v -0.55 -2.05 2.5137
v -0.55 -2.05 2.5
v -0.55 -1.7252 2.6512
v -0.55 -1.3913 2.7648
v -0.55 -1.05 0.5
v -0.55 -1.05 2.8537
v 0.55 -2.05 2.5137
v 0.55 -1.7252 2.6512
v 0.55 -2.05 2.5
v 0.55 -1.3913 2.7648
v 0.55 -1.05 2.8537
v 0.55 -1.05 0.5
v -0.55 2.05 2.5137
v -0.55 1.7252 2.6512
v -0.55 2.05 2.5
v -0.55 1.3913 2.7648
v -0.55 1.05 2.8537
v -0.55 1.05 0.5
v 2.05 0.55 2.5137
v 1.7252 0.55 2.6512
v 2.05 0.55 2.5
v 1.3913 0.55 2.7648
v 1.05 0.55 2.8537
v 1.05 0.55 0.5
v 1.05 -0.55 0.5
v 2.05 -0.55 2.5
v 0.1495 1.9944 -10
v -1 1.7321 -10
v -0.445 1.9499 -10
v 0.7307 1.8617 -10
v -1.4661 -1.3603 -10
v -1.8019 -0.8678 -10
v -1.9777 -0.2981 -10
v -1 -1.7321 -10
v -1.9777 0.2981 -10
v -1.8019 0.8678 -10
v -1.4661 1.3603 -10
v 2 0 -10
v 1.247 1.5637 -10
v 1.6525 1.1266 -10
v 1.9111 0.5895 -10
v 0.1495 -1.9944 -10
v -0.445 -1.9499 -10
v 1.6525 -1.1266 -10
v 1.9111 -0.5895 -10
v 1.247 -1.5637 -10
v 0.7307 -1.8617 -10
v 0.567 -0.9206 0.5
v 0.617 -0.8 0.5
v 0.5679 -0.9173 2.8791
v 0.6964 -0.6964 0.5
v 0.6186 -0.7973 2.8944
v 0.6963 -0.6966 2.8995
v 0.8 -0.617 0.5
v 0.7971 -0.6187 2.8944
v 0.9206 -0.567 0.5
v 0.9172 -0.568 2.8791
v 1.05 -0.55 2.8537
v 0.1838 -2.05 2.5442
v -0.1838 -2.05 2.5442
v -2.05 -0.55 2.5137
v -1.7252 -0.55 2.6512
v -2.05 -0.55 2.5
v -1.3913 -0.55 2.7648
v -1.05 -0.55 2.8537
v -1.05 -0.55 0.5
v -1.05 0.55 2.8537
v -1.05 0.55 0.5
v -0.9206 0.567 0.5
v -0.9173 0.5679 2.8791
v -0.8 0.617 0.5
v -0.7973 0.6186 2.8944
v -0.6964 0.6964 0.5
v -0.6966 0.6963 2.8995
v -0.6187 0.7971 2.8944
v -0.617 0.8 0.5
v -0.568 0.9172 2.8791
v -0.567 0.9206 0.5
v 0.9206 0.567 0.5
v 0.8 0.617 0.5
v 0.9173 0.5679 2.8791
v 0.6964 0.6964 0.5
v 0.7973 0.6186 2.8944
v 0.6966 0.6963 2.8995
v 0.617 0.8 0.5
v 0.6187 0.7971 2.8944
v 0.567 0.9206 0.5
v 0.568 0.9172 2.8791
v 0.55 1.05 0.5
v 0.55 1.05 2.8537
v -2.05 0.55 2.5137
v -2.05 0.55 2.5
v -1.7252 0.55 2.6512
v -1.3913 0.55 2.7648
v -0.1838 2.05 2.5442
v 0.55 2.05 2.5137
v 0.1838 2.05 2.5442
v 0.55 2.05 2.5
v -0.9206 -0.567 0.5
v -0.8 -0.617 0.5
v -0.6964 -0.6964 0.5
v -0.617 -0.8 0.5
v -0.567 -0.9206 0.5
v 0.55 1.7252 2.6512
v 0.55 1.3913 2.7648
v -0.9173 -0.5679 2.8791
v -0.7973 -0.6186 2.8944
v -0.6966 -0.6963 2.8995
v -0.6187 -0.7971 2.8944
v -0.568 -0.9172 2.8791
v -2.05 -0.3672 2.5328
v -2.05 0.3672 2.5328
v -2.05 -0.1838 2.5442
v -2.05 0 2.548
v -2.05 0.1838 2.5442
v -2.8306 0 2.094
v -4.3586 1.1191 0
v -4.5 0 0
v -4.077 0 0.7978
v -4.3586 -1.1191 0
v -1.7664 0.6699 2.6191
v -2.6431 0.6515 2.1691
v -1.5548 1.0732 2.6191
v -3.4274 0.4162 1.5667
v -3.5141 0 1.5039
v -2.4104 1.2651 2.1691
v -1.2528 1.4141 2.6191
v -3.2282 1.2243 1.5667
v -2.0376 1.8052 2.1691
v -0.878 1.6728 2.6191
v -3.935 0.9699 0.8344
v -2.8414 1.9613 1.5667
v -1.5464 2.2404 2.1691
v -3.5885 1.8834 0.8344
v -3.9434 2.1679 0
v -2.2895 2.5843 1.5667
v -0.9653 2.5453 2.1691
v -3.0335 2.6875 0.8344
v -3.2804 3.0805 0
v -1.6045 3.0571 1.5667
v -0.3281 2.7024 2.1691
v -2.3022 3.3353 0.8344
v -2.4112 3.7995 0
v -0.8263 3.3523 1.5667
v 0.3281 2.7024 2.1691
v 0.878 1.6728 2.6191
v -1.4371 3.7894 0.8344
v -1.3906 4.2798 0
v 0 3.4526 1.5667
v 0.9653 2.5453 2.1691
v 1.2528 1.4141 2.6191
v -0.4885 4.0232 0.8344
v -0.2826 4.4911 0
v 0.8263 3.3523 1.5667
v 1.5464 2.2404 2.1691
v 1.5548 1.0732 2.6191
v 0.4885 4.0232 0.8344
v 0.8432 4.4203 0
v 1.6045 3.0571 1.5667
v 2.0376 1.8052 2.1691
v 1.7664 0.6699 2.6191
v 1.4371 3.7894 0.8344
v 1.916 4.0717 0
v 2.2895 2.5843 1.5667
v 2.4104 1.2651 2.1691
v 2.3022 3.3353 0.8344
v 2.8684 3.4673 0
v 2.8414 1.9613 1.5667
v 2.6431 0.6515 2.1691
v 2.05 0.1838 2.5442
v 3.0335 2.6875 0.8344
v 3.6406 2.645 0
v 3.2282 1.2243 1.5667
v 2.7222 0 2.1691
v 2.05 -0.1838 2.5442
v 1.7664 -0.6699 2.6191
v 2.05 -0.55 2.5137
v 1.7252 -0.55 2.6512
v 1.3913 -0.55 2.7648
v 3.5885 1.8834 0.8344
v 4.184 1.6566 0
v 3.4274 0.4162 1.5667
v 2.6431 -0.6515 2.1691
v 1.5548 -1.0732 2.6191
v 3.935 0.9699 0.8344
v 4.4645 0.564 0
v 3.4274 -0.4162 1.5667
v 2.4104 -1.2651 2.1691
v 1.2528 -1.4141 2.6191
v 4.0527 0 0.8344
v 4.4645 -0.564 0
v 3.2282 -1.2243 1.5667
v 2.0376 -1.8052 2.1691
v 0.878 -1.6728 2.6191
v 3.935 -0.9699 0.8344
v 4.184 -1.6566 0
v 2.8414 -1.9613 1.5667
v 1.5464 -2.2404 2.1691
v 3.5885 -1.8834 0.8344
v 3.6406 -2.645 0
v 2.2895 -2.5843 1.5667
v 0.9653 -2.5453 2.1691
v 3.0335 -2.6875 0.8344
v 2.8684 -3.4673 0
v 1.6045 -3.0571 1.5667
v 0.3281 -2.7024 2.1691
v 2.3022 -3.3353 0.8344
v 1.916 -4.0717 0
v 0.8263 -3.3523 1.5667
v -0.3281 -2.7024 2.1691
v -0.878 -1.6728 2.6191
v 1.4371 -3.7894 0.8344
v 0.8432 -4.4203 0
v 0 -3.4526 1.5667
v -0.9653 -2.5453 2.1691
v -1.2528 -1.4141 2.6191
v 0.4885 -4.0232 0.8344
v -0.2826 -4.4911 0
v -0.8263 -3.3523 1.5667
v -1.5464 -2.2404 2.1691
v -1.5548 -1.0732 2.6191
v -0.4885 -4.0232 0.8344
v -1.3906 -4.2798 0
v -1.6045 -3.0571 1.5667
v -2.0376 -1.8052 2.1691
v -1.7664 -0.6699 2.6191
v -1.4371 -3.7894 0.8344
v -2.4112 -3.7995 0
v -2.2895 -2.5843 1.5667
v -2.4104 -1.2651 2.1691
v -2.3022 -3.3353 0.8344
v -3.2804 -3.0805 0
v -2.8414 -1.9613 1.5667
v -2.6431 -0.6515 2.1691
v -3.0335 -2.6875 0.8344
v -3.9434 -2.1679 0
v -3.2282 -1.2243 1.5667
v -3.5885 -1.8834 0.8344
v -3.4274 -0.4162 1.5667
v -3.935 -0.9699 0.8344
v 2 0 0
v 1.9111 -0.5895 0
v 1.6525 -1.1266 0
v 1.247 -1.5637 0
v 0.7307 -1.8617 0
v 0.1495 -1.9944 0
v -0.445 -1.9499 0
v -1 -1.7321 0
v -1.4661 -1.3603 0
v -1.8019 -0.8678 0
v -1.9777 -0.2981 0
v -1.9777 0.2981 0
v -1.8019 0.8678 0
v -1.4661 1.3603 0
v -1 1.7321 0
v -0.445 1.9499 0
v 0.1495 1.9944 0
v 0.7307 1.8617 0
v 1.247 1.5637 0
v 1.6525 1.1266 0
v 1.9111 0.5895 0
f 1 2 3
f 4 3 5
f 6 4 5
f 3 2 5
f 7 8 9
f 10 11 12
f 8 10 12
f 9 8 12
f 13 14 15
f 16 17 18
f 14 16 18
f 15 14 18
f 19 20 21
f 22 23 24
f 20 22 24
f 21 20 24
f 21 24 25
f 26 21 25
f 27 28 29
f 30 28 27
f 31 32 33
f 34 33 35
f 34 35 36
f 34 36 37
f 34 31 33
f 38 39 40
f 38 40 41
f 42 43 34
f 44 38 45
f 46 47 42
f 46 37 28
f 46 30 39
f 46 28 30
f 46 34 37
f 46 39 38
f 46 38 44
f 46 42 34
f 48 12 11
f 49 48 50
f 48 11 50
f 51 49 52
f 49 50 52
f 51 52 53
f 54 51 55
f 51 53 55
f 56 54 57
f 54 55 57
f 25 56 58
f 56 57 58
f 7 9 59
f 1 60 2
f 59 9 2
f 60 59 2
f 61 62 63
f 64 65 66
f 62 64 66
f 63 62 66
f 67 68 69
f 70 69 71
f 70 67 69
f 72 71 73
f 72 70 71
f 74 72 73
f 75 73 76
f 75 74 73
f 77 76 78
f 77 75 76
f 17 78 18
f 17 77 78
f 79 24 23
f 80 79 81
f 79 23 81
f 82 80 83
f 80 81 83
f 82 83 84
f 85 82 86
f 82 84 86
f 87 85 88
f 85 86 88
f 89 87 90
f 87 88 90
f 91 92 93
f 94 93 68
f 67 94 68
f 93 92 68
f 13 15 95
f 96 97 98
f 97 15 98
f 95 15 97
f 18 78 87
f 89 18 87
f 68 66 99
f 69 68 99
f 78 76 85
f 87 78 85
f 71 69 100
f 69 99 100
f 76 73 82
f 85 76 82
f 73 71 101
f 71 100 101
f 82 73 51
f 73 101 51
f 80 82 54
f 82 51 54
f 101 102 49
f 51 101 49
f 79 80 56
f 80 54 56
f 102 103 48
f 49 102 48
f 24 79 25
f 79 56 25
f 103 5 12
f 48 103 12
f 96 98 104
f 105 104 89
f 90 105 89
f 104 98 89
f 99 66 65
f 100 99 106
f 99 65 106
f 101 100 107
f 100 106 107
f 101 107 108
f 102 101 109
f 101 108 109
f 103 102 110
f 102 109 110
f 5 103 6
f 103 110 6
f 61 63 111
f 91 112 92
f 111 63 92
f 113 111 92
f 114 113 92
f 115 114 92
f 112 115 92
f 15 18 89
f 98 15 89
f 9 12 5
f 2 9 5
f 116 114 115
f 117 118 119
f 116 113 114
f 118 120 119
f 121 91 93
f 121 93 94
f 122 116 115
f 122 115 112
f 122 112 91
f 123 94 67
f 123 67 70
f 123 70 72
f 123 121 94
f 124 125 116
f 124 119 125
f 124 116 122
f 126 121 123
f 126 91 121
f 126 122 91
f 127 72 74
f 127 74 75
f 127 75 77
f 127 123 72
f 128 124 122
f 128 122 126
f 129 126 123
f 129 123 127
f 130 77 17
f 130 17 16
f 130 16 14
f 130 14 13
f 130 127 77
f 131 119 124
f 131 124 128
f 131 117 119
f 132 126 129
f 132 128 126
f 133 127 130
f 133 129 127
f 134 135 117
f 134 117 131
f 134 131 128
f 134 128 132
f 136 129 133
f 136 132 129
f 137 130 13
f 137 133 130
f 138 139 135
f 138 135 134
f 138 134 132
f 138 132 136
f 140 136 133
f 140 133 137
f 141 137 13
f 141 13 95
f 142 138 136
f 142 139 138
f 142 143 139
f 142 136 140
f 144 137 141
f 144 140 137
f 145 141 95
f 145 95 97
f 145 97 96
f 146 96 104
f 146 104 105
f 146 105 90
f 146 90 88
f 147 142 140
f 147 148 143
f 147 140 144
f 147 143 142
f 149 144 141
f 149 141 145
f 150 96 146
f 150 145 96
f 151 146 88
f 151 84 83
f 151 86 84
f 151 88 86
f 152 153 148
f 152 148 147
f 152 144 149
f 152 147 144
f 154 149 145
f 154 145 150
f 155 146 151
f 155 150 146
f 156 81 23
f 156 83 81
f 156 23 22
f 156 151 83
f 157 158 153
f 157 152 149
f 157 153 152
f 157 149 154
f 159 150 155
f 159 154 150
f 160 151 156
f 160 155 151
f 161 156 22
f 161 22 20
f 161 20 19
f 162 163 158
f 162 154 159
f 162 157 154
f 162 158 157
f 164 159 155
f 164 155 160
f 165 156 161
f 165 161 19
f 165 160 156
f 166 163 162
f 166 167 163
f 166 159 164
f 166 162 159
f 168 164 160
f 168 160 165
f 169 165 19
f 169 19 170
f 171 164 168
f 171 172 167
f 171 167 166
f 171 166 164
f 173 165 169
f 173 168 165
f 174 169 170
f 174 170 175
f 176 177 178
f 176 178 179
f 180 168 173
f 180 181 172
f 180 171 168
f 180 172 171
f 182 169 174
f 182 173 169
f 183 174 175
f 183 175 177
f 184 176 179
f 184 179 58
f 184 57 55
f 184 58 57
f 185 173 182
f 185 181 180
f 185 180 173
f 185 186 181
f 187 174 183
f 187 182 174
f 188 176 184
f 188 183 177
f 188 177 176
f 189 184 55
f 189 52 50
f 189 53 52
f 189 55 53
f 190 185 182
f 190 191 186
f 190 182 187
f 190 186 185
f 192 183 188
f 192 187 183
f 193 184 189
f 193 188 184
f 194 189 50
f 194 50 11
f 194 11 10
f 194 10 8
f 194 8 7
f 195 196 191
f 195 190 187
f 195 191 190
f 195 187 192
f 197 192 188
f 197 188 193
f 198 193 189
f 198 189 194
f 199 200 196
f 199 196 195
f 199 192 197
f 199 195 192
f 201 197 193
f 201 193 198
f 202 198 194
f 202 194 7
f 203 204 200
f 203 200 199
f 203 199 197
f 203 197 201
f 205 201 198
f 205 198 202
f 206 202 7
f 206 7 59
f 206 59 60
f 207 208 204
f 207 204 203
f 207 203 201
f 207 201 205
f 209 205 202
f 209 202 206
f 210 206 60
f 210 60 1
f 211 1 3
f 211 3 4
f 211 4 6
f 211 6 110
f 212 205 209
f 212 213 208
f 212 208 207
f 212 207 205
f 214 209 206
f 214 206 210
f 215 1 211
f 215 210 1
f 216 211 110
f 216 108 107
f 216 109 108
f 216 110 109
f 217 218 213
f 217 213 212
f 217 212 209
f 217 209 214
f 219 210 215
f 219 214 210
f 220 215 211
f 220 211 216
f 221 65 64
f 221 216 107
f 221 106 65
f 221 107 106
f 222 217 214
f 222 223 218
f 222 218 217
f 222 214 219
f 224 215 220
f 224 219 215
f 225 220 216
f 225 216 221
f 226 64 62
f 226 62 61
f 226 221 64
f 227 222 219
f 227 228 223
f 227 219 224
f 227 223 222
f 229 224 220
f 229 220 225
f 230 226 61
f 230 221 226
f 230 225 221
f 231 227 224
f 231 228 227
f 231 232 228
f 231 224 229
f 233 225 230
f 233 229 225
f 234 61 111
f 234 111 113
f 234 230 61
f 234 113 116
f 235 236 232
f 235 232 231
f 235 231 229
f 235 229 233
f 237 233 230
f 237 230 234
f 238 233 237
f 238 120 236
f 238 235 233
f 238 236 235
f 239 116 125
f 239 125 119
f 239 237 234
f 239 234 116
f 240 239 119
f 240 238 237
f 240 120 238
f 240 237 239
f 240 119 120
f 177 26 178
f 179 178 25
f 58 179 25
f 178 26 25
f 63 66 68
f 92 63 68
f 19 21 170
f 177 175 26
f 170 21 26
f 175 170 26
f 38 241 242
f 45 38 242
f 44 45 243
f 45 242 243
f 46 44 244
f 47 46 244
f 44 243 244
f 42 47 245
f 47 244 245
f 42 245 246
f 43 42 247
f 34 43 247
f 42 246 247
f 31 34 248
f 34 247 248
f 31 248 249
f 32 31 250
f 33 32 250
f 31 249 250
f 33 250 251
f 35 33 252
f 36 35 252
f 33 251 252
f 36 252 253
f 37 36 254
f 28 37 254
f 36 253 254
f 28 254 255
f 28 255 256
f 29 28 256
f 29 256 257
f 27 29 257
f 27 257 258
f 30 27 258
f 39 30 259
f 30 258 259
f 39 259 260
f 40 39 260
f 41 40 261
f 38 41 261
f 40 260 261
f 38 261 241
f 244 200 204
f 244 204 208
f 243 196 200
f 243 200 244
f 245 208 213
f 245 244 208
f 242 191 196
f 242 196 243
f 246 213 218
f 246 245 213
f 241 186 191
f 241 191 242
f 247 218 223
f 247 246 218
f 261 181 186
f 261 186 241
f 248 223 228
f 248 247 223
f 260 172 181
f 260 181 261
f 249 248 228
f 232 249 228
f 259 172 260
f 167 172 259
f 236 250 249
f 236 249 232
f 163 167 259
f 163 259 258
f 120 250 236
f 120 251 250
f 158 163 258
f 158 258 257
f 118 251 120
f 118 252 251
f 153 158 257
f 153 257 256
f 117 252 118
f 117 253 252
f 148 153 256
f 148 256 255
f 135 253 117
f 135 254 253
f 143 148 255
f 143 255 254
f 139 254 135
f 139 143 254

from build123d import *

# Parameters (mm, degrees)
F2_R     = 2
F3_DEPTH = 10
F5_START = -0.5
F5_DEPTH = 2.501
F6_SIZE2 = 1
F6_SIZE  = 2
F7_R     = 0.5


with BuildPart() as f1:
    # F0 (on Front) → F1 (revolve)
    with BuildSketch(Plane.XZ):
        with BuildLine():
            Line((0, 0), (0, 3))
            ThreePointArc((0, 3), (-2.7041634566, 2.1812451849), (-4.5, 0))
            Line((-4.5, 0), (0, 0))
        make_face()
    revolve(axis=Axis((0, 0, 1.5), (0, 0, -1)))

    # F2 (on face) → F3 (join)
    with BuildSketch(Plane(origin=(0, 0, 0), x_dir=(1, 0, 0), z_dir=(0, 0, -1))):
        Circle(F2_R)
    extrude(amount=F3_DEPTH)

    # F4 (on face) → F5 (cut)
    with BuildSketch(Plane(origin=(0, 0, 0), x_dir=(1, 0, 0), z_dir=(0, 0, -1)).offset(F5_START)):
        Polygon((0.55, 2.05), (0, 2.05), (-0.55, 2.05), (-0.55, 0.55), (-2.05, 0.55), (-2.05, 0), (-2.05, -0.55), (-0.55, -0.55), (-0.55, -2.05), (0, -2.05), (0.55, -2.05), (0.55, -0.55), (2.05, -0.55), (2.05, 0), (2.05, 0.55), (0.55, 0.55), align=None)
    extrude(amount=-F5_DEPTH, mode=Mode.SUBTRACT)

    # F6
    f6_edges = [f1.edges().sort_by_distance(p)[0] for p in [
        (2.05, 0, 0.5),
        (0, 2.05, 0.5),
        (0, -2.05, 0.5),
        (-2.05, 0, 0.5),
    ]]
    chamfer(f6_edges, length=F6_SIZE, length2=F6_SIZE2)

    # F7
    f7_edges = [f1.edges().sort_by_distance(p)[0] for p in [
        (0.55, -0.55, 1.718774),
        (0.55, 0.55, 1.718774),
        (-0.55, -0.55, 1.718774),
        (-0.55, 0.55, 1.718774),
    ]]
    fillet(f7_edges, radius=F7_R)


solid = f1.part
